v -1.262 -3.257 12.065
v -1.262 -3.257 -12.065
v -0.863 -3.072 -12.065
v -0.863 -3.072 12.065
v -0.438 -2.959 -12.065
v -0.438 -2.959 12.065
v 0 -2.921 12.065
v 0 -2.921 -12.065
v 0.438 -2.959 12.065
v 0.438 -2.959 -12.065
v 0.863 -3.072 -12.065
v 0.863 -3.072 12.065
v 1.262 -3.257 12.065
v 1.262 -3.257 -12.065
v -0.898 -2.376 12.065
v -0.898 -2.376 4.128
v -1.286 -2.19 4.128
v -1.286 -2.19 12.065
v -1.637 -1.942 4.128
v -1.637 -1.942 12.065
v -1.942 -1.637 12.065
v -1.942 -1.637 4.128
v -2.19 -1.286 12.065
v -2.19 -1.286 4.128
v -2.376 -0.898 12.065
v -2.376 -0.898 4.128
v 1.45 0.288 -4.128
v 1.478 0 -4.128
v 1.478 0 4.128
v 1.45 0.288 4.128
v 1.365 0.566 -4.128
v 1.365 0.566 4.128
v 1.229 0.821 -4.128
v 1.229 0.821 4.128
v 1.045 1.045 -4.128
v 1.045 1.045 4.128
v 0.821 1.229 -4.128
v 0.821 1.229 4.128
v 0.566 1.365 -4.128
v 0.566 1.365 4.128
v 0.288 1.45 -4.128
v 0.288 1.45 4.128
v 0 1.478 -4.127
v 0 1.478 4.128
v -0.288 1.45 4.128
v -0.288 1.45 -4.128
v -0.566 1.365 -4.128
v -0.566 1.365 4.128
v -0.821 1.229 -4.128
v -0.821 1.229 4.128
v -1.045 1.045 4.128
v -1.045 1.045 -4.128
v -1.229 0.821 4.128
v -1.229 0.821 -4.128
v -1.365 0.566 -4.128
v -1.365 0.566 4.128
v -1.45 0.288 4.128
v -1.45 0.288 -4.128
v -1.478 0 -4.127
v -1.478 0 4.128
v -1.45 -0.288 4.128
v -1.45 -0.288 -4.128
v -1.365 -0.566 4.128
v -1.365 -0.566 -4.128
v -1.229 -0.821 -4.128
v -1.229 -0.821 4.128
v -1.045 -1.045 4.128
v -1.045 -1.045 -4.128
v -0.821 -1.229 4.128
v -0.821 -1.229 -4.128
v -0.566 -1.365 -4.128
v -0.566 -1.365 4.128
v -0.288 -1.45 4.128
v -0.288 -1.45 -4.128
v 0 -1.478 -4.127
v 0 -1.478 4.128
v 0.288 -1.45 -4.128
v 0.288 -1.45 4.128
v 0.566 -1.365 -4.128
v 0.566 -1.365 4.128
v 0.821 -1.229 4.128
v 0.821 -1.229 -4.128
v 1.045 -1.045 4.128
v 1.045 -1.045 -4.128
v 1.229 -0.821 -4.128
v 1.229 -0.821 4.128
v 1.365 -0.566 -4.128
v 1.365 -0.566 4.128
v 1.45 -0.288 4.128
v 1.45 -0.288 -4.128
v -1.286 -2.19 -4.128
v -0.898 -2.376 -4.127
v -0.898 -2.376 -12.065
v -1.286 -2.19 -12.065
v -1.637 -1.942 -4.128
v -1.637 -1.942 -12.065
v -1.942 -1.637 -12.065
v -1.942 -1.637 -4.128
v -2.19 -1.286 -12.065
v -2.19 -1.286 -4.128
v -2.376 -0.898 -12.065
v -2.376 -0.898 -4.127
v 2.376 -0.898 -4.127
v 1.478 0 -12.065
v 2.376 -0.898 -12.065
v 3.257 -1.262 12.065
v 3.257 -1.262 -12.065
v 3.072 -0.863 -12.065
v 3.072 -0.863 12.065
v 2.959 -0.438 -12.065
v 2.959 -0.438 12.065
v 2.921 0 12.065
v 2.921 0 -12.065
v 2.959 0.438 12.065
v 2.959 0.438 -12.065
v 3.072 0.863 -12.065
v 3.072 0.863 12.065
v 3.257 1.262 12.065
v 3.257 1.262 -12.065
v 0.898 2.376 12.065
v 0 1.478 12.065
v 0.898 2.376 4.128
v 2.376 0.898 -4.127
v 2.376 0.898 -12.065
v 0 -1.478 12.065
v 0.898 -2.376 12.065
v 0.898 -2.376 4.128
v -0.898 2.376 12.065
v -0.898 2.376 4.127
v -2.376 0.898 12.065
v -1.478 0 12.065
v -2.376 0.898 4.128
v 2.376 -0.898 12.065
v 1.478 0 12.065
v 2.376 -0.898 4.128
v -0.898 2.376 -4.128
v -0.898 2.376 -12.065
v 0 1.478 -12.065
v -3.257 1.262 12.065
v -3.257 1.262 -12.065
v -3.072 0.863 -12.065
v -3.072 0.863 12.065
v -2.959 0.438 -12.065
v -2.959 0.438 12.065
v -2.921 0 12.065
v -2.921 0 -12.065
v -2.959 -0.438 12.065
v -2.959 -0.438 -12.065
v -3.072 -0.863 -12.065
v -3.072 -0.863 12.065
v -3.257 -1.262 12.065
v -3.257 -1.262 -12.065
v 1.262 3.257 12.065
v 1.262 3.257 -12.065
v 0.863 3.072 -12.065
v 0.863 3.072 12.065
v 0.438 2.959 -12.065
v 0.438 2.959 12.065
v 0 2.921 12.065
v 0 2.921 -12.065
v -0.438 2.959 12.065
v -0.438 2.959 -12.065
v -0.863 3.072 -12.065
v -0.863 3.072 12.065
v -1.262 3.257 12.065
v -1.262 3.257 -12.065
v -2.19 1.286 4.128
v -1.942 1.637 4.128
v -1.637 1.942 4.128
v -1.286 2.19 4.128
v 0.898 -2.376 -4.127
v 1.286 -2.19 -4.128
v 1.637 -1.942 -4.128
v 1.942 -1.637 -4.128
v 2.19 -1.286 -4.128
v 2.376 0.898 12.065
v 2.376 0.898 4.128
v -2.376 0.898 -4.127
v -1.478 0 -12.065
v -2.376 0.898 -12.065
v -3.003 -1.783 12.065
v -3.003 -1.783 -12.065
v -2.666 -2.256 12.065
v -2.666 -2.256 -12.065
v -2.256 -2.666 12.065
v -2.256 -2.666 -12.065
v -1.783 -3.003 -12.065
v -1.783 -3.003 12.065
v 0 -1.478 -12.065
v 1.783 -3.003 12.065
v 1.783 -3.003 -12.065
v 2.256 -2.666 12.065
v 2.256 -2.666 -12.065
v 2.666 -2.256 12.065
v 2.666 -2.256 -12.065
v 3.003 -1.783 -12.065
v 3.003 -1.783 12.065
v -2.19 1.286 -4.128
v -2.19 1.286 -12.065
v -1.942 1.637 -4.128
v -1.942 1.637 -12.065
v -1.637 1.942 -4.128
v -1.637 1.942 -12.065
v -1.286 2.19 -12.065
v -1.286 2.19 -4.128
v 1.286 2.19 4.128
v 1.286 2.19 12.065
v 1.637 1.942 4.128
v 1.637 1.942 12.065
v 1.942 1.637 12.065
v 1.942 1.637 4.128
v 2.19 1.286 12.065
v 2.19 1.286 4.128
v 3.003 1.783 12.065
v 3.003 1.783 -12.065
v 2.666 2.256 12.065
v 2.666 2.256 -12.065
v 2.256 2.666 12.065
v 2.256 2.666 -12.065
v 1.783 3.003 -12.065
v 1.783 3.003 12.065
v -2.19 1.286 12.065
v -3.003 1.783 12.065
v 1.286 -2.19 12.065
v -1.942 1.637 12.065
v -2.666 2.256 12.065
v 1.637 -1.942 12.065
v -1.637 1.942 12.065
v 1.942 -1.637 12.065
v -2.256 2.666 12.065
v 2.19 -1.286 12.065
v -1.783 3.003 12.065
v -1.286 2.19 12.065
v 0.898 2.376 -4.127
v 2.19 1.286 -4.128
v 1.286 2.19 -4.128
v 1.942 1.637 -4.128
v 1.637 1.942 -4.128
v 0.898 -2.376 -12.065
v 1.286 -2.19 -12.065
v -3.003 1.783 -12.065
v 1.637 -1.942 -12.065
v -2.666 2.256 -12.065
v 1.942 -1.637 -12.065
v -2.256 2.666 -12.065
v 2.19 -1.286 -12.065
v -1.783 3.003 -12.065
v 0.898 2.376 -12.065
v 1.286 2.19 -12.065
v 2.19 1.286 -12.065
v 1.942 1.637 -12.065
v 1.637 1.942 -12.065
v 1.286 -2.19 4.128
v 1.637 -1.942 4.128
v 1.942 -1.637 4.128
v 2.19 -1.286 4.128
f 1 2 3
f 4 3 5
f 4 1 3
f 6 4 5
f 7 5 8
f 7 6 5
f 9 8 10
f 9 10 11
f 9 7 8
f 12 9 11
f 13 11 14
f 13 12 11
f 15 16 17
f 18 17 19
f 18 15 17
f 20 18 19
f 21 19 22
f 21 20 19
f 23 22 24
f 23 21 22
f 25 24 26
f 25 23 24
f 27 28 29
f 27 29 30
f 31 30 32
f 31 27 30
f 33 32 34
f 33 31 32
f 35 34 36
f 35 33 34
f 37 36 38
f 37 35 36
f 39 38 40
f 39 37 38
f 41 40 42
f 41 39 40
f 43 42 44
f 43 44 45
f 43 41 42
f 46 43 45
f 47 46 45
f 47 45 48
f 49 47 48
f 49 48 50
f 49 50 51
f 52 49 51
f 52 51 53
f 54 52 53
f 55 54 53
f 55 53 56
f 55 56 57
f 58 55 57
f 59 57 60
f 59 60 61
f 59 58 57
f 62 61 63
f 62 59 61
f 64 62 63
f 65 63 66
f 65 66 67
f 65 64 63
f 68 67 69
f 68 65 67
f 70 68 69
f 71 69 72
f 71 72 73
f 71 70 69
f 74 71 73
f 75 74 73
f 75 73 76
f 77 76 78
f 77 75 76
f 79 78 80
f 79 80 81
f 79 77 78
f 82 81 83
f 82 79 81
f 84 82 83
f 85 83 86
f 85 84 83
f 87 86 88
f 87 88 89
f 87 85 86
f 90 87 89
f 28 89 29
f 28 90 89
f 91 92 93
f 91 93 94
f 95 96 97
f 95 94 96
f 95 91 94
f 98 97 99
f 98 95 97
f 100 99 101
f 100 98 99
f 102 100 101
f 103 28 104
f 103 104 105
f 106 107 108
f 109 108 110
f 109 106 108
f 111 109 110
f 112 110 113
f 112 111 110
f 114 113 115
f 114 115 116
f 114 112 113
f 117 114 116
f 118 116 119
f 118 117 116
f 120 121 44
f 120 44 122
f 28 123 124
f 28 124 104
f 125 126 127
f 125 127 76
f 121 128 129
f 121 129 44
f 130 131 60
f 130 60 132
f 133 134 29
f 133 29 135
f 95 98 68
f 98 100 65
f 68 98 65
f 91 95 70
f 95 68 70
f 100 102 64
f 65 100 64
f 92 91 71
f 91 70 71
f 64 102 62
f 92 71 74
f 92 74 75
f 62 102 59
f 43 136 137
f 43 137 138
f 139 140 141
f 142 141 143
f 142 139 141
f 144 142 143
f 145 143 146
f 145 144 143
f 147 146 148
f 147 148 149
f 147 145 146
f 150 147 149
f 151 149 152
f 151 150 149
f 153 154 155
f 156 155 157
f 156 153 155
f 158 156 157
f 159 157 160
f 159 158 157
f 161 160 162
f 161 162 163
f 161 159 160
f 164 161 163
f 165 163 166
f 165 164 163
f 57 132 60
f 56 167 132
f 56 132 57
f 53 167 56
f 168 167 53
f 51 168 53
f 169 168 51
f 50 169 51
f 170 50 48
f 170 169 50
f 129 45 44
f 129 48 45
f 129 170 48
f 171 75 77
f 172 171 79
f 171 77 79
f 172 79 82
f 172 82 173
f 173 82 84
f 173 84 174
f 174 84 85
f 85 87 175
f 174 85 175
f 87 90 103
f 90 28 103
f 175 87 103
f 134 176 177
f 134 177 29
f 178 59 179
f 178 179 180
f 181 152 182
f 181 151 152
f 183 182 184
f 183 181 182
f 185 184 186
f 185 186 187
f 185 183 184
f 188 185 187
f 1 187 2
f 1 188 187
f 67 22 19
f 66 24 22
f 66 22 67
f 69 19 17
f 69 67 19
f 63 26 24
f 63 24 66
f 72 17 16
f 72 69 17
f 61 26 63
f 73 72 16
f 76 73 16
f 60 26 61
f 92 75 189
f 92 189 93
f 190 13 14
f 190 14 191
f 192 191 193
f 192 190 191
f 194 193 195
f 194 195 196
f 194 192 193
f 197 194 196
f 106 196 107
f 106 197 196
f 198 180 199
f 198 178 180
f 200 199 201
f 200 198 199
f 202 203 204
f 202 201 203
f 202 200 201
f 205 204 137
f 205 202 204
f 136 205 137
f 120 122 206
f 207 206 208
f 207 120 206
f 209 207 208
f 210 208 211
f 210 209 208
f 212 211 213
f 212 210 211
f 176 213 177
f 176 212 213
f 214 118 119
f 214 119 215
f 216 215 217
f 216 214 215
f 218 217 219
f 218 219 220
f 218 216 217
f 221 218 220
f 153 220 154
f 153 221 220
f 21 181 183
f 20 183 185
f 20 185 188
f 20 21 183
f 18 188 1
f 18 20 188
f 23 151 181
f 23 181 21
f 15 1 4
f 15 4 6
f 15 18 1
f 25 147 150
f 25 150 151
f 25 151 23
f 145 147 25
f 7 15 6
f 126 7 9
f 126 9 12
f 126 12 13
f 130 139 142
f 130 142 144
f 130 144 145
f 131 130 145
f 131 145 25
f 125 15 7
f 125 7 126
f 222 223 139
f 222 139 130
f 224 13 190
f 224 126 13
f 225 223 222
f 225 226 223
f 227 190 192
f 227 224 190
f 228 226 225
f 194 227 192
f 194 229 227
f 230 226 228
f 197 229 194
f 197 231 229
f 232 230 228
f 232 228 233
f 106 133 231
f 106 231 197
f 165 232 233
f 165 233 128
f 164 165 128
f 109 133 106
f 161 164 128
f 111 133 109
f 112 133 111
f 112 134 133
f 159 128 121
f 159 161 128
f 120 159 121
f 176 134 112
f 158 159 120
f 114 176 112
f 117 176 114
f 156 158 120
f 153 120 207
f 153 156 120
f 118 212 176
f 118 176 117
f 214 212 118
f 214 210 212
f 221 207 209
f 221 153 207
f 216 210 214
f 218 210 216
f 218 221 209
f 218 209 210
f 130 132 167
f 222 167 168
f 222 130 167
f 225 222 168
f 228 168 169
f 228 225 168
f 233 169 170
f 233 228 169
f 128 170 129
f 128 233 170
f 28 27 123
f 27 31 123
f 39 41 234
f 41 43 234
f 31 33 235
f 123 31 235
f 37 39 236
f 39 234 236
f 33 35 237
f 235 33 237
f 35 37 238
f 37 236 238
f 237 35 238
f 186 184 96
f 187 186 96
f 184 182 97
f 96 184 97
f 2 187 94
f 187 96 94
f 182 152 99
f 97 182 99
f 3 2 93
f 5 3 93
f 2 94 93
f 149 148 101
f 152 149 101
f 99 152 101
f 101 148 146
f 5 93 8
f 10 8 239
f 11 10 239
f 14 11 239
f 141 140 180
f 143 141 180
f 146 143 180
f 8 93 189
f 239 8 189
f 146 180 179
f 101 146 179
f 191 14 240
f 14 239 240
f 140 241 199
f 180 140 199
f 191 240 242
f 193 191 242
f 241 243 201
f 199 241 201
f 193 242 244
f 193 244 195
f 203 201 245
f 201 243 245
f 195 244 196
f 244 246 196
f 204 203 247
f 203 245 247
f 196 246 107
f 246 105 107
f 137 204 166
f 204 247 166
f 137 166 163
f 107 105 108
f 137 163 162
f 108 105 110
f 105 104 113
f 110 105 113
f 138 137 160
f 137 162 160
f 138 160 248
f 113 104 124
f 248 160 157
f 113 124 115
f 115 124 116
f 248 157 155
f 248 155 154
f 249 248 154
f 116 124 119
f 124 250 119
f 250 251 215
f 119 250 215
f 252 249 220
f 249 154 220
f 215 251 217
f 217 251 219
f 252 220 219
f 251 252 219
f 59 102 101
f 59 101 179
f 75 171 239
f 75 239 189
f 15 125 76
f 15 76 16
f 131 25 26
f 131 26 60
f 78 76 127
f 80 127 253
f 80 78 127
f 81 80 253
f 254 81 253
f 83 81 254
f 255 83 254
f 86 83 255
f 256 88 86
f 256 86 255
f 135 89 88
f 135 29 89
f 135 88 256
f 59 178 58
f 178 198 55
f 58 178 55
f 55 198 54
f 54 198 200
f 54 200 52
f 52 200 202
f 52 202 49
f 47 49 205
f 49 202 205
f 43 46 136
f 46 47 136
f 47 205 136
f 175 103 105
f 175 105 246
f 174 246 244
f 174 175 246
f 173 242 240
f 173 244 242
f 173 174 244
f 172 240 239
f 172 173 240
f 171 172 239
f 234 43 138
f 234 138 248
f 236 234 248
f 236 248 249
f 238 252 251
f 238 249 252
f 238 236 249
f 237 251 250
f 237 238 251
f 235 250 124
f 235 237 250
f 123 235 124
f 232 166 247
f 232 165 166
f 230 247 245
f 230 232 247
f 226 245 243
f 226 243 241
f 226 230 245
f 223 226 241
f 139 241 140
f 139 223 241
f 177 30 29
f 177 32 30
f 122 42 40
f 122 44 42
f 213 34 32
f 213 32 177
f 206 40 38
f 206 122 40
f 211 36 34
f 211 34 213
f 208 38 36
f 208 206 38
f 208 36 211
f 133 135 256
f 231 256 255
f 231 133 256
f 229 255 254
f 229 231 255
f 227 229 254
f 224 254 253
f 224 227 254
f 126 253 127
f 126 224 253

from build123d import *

# Parameters (mm, degrees)
BOSS_EXTRUDE1_DEPTH     = 12.065
CUT_EXTRUDE1_DEPTH      = 13.065
CUT_EXTRUDE1_DEPTH_BACK = 13.065
SKETCH3_R               = 2.54
SKETCH3_R_2             = 1.477926828
BOSS_EXTRUDE2_DEPTH     = 4.1275


with BuildPart() as part:
    # Sketch1 → Boss-Extrude1 (new body, symmetric)
    with BuildSketch(Plane.XY):
        with BuildLine():
            ThreePointArc((-3.256590116, -1.261814988), (-2.469570433, -2.469570433), (-1.261814988, -3.256590116))
            ThreePointArc((-1.261814988, -3.256590116), (0, -2.921), (1.261814988, -3.256590116))
            ThreePointArc((1.261814988, -3.256590116), (2.469570433, -2.469570433), (3.256590116, -1.261814988))
            ThreePointArc((3.256590116, -1.261814988), (2.921, 0), (3.256590116, 1.261814988))
            ThreePointArc((3.256590116, 1.261814988), (2.469570433, 2.469570433), (1.261814988, 3.256590116))
            ThreePointArc((1.261814988, 3.256590116), (0, 2.921), (-1.261814988, 3.256590116))
            ThreePointArc((-1.261814988, 3.256590116), (-2.469570433, 2.469570433), (-3.256590116, 1.261814988))
            ThreePointArc((-3.256590116, 1.261814988), (-2.921, 0), (-3.256590116, -1.261814988))
        make_face()
    extrude(amount=BOSS_EXTRUDE1_DEPTH, both=True)

    # Sketch2 → Cut-Extrude1 (cut, two sides)
    with BuildSketch(Plane.XY) as cut_extrude1_sk:
        with BuildLine():
            Line((-0.898025612, 2.375952441), (0, 1.477926828))
            Line((0, 1.477926828), (0.898025612, 2.375952441))
            ThreePointArc((0.898025612, 2.375952441), (1.796051224, 1.796051224), (2.375952441, 0.898025612))
            Line((2.375952441, 0.898025612), (1.477926828, 0))
            Line((1.477926828, 0), (2.375952441, -0.898025612))
            ThreePointArc((2.375952441, -0.898025612), (1.796051224, -1.796051224), (0.898025612, -2.375952441))
            Line((0.898025612, -2.375952441), (0, -1.477926828))
            Line((0, -1.477926828), (-0.898025612, -2.375952441))
            ThreePointArc((-0.898025612, -2.375952441), (-1.796051224, -1.796051224), (-2.375952441, -0.898025612))
            Line((-2.375952441, -0.898025612), (-1.477926828, 0))
            Line((-1.477926828, 0), (-2.375952441, 0.898025612))
            ThreePointArc((-2.375952441, 0.898025612), (-1.796051224, 1.796051224), (-0.898025612, 2.375952441))
        make_face()
    extrude(amount=CUT_EXTRUDE1_DEPTH, mode=Mode.SUBTRACT)
    extrude(cut_extrude1_sk.sketch, amount=-CUT_EXTRUDE1_DEPTH_BACK, mode=Mode.SUBTRACT)

    # Sketch3 → Boss-Extrude2 (add, symmetric)
    with BuildSketch(Plane.XY):
        Circle(SKETCH3_R)
        Circle(SKETCH3_R_2, mode=Mode.SUBTRACT)
    extrude(amount=BOSS_EXTRUDE2_DEPTH, both=True)


solid = part.part
